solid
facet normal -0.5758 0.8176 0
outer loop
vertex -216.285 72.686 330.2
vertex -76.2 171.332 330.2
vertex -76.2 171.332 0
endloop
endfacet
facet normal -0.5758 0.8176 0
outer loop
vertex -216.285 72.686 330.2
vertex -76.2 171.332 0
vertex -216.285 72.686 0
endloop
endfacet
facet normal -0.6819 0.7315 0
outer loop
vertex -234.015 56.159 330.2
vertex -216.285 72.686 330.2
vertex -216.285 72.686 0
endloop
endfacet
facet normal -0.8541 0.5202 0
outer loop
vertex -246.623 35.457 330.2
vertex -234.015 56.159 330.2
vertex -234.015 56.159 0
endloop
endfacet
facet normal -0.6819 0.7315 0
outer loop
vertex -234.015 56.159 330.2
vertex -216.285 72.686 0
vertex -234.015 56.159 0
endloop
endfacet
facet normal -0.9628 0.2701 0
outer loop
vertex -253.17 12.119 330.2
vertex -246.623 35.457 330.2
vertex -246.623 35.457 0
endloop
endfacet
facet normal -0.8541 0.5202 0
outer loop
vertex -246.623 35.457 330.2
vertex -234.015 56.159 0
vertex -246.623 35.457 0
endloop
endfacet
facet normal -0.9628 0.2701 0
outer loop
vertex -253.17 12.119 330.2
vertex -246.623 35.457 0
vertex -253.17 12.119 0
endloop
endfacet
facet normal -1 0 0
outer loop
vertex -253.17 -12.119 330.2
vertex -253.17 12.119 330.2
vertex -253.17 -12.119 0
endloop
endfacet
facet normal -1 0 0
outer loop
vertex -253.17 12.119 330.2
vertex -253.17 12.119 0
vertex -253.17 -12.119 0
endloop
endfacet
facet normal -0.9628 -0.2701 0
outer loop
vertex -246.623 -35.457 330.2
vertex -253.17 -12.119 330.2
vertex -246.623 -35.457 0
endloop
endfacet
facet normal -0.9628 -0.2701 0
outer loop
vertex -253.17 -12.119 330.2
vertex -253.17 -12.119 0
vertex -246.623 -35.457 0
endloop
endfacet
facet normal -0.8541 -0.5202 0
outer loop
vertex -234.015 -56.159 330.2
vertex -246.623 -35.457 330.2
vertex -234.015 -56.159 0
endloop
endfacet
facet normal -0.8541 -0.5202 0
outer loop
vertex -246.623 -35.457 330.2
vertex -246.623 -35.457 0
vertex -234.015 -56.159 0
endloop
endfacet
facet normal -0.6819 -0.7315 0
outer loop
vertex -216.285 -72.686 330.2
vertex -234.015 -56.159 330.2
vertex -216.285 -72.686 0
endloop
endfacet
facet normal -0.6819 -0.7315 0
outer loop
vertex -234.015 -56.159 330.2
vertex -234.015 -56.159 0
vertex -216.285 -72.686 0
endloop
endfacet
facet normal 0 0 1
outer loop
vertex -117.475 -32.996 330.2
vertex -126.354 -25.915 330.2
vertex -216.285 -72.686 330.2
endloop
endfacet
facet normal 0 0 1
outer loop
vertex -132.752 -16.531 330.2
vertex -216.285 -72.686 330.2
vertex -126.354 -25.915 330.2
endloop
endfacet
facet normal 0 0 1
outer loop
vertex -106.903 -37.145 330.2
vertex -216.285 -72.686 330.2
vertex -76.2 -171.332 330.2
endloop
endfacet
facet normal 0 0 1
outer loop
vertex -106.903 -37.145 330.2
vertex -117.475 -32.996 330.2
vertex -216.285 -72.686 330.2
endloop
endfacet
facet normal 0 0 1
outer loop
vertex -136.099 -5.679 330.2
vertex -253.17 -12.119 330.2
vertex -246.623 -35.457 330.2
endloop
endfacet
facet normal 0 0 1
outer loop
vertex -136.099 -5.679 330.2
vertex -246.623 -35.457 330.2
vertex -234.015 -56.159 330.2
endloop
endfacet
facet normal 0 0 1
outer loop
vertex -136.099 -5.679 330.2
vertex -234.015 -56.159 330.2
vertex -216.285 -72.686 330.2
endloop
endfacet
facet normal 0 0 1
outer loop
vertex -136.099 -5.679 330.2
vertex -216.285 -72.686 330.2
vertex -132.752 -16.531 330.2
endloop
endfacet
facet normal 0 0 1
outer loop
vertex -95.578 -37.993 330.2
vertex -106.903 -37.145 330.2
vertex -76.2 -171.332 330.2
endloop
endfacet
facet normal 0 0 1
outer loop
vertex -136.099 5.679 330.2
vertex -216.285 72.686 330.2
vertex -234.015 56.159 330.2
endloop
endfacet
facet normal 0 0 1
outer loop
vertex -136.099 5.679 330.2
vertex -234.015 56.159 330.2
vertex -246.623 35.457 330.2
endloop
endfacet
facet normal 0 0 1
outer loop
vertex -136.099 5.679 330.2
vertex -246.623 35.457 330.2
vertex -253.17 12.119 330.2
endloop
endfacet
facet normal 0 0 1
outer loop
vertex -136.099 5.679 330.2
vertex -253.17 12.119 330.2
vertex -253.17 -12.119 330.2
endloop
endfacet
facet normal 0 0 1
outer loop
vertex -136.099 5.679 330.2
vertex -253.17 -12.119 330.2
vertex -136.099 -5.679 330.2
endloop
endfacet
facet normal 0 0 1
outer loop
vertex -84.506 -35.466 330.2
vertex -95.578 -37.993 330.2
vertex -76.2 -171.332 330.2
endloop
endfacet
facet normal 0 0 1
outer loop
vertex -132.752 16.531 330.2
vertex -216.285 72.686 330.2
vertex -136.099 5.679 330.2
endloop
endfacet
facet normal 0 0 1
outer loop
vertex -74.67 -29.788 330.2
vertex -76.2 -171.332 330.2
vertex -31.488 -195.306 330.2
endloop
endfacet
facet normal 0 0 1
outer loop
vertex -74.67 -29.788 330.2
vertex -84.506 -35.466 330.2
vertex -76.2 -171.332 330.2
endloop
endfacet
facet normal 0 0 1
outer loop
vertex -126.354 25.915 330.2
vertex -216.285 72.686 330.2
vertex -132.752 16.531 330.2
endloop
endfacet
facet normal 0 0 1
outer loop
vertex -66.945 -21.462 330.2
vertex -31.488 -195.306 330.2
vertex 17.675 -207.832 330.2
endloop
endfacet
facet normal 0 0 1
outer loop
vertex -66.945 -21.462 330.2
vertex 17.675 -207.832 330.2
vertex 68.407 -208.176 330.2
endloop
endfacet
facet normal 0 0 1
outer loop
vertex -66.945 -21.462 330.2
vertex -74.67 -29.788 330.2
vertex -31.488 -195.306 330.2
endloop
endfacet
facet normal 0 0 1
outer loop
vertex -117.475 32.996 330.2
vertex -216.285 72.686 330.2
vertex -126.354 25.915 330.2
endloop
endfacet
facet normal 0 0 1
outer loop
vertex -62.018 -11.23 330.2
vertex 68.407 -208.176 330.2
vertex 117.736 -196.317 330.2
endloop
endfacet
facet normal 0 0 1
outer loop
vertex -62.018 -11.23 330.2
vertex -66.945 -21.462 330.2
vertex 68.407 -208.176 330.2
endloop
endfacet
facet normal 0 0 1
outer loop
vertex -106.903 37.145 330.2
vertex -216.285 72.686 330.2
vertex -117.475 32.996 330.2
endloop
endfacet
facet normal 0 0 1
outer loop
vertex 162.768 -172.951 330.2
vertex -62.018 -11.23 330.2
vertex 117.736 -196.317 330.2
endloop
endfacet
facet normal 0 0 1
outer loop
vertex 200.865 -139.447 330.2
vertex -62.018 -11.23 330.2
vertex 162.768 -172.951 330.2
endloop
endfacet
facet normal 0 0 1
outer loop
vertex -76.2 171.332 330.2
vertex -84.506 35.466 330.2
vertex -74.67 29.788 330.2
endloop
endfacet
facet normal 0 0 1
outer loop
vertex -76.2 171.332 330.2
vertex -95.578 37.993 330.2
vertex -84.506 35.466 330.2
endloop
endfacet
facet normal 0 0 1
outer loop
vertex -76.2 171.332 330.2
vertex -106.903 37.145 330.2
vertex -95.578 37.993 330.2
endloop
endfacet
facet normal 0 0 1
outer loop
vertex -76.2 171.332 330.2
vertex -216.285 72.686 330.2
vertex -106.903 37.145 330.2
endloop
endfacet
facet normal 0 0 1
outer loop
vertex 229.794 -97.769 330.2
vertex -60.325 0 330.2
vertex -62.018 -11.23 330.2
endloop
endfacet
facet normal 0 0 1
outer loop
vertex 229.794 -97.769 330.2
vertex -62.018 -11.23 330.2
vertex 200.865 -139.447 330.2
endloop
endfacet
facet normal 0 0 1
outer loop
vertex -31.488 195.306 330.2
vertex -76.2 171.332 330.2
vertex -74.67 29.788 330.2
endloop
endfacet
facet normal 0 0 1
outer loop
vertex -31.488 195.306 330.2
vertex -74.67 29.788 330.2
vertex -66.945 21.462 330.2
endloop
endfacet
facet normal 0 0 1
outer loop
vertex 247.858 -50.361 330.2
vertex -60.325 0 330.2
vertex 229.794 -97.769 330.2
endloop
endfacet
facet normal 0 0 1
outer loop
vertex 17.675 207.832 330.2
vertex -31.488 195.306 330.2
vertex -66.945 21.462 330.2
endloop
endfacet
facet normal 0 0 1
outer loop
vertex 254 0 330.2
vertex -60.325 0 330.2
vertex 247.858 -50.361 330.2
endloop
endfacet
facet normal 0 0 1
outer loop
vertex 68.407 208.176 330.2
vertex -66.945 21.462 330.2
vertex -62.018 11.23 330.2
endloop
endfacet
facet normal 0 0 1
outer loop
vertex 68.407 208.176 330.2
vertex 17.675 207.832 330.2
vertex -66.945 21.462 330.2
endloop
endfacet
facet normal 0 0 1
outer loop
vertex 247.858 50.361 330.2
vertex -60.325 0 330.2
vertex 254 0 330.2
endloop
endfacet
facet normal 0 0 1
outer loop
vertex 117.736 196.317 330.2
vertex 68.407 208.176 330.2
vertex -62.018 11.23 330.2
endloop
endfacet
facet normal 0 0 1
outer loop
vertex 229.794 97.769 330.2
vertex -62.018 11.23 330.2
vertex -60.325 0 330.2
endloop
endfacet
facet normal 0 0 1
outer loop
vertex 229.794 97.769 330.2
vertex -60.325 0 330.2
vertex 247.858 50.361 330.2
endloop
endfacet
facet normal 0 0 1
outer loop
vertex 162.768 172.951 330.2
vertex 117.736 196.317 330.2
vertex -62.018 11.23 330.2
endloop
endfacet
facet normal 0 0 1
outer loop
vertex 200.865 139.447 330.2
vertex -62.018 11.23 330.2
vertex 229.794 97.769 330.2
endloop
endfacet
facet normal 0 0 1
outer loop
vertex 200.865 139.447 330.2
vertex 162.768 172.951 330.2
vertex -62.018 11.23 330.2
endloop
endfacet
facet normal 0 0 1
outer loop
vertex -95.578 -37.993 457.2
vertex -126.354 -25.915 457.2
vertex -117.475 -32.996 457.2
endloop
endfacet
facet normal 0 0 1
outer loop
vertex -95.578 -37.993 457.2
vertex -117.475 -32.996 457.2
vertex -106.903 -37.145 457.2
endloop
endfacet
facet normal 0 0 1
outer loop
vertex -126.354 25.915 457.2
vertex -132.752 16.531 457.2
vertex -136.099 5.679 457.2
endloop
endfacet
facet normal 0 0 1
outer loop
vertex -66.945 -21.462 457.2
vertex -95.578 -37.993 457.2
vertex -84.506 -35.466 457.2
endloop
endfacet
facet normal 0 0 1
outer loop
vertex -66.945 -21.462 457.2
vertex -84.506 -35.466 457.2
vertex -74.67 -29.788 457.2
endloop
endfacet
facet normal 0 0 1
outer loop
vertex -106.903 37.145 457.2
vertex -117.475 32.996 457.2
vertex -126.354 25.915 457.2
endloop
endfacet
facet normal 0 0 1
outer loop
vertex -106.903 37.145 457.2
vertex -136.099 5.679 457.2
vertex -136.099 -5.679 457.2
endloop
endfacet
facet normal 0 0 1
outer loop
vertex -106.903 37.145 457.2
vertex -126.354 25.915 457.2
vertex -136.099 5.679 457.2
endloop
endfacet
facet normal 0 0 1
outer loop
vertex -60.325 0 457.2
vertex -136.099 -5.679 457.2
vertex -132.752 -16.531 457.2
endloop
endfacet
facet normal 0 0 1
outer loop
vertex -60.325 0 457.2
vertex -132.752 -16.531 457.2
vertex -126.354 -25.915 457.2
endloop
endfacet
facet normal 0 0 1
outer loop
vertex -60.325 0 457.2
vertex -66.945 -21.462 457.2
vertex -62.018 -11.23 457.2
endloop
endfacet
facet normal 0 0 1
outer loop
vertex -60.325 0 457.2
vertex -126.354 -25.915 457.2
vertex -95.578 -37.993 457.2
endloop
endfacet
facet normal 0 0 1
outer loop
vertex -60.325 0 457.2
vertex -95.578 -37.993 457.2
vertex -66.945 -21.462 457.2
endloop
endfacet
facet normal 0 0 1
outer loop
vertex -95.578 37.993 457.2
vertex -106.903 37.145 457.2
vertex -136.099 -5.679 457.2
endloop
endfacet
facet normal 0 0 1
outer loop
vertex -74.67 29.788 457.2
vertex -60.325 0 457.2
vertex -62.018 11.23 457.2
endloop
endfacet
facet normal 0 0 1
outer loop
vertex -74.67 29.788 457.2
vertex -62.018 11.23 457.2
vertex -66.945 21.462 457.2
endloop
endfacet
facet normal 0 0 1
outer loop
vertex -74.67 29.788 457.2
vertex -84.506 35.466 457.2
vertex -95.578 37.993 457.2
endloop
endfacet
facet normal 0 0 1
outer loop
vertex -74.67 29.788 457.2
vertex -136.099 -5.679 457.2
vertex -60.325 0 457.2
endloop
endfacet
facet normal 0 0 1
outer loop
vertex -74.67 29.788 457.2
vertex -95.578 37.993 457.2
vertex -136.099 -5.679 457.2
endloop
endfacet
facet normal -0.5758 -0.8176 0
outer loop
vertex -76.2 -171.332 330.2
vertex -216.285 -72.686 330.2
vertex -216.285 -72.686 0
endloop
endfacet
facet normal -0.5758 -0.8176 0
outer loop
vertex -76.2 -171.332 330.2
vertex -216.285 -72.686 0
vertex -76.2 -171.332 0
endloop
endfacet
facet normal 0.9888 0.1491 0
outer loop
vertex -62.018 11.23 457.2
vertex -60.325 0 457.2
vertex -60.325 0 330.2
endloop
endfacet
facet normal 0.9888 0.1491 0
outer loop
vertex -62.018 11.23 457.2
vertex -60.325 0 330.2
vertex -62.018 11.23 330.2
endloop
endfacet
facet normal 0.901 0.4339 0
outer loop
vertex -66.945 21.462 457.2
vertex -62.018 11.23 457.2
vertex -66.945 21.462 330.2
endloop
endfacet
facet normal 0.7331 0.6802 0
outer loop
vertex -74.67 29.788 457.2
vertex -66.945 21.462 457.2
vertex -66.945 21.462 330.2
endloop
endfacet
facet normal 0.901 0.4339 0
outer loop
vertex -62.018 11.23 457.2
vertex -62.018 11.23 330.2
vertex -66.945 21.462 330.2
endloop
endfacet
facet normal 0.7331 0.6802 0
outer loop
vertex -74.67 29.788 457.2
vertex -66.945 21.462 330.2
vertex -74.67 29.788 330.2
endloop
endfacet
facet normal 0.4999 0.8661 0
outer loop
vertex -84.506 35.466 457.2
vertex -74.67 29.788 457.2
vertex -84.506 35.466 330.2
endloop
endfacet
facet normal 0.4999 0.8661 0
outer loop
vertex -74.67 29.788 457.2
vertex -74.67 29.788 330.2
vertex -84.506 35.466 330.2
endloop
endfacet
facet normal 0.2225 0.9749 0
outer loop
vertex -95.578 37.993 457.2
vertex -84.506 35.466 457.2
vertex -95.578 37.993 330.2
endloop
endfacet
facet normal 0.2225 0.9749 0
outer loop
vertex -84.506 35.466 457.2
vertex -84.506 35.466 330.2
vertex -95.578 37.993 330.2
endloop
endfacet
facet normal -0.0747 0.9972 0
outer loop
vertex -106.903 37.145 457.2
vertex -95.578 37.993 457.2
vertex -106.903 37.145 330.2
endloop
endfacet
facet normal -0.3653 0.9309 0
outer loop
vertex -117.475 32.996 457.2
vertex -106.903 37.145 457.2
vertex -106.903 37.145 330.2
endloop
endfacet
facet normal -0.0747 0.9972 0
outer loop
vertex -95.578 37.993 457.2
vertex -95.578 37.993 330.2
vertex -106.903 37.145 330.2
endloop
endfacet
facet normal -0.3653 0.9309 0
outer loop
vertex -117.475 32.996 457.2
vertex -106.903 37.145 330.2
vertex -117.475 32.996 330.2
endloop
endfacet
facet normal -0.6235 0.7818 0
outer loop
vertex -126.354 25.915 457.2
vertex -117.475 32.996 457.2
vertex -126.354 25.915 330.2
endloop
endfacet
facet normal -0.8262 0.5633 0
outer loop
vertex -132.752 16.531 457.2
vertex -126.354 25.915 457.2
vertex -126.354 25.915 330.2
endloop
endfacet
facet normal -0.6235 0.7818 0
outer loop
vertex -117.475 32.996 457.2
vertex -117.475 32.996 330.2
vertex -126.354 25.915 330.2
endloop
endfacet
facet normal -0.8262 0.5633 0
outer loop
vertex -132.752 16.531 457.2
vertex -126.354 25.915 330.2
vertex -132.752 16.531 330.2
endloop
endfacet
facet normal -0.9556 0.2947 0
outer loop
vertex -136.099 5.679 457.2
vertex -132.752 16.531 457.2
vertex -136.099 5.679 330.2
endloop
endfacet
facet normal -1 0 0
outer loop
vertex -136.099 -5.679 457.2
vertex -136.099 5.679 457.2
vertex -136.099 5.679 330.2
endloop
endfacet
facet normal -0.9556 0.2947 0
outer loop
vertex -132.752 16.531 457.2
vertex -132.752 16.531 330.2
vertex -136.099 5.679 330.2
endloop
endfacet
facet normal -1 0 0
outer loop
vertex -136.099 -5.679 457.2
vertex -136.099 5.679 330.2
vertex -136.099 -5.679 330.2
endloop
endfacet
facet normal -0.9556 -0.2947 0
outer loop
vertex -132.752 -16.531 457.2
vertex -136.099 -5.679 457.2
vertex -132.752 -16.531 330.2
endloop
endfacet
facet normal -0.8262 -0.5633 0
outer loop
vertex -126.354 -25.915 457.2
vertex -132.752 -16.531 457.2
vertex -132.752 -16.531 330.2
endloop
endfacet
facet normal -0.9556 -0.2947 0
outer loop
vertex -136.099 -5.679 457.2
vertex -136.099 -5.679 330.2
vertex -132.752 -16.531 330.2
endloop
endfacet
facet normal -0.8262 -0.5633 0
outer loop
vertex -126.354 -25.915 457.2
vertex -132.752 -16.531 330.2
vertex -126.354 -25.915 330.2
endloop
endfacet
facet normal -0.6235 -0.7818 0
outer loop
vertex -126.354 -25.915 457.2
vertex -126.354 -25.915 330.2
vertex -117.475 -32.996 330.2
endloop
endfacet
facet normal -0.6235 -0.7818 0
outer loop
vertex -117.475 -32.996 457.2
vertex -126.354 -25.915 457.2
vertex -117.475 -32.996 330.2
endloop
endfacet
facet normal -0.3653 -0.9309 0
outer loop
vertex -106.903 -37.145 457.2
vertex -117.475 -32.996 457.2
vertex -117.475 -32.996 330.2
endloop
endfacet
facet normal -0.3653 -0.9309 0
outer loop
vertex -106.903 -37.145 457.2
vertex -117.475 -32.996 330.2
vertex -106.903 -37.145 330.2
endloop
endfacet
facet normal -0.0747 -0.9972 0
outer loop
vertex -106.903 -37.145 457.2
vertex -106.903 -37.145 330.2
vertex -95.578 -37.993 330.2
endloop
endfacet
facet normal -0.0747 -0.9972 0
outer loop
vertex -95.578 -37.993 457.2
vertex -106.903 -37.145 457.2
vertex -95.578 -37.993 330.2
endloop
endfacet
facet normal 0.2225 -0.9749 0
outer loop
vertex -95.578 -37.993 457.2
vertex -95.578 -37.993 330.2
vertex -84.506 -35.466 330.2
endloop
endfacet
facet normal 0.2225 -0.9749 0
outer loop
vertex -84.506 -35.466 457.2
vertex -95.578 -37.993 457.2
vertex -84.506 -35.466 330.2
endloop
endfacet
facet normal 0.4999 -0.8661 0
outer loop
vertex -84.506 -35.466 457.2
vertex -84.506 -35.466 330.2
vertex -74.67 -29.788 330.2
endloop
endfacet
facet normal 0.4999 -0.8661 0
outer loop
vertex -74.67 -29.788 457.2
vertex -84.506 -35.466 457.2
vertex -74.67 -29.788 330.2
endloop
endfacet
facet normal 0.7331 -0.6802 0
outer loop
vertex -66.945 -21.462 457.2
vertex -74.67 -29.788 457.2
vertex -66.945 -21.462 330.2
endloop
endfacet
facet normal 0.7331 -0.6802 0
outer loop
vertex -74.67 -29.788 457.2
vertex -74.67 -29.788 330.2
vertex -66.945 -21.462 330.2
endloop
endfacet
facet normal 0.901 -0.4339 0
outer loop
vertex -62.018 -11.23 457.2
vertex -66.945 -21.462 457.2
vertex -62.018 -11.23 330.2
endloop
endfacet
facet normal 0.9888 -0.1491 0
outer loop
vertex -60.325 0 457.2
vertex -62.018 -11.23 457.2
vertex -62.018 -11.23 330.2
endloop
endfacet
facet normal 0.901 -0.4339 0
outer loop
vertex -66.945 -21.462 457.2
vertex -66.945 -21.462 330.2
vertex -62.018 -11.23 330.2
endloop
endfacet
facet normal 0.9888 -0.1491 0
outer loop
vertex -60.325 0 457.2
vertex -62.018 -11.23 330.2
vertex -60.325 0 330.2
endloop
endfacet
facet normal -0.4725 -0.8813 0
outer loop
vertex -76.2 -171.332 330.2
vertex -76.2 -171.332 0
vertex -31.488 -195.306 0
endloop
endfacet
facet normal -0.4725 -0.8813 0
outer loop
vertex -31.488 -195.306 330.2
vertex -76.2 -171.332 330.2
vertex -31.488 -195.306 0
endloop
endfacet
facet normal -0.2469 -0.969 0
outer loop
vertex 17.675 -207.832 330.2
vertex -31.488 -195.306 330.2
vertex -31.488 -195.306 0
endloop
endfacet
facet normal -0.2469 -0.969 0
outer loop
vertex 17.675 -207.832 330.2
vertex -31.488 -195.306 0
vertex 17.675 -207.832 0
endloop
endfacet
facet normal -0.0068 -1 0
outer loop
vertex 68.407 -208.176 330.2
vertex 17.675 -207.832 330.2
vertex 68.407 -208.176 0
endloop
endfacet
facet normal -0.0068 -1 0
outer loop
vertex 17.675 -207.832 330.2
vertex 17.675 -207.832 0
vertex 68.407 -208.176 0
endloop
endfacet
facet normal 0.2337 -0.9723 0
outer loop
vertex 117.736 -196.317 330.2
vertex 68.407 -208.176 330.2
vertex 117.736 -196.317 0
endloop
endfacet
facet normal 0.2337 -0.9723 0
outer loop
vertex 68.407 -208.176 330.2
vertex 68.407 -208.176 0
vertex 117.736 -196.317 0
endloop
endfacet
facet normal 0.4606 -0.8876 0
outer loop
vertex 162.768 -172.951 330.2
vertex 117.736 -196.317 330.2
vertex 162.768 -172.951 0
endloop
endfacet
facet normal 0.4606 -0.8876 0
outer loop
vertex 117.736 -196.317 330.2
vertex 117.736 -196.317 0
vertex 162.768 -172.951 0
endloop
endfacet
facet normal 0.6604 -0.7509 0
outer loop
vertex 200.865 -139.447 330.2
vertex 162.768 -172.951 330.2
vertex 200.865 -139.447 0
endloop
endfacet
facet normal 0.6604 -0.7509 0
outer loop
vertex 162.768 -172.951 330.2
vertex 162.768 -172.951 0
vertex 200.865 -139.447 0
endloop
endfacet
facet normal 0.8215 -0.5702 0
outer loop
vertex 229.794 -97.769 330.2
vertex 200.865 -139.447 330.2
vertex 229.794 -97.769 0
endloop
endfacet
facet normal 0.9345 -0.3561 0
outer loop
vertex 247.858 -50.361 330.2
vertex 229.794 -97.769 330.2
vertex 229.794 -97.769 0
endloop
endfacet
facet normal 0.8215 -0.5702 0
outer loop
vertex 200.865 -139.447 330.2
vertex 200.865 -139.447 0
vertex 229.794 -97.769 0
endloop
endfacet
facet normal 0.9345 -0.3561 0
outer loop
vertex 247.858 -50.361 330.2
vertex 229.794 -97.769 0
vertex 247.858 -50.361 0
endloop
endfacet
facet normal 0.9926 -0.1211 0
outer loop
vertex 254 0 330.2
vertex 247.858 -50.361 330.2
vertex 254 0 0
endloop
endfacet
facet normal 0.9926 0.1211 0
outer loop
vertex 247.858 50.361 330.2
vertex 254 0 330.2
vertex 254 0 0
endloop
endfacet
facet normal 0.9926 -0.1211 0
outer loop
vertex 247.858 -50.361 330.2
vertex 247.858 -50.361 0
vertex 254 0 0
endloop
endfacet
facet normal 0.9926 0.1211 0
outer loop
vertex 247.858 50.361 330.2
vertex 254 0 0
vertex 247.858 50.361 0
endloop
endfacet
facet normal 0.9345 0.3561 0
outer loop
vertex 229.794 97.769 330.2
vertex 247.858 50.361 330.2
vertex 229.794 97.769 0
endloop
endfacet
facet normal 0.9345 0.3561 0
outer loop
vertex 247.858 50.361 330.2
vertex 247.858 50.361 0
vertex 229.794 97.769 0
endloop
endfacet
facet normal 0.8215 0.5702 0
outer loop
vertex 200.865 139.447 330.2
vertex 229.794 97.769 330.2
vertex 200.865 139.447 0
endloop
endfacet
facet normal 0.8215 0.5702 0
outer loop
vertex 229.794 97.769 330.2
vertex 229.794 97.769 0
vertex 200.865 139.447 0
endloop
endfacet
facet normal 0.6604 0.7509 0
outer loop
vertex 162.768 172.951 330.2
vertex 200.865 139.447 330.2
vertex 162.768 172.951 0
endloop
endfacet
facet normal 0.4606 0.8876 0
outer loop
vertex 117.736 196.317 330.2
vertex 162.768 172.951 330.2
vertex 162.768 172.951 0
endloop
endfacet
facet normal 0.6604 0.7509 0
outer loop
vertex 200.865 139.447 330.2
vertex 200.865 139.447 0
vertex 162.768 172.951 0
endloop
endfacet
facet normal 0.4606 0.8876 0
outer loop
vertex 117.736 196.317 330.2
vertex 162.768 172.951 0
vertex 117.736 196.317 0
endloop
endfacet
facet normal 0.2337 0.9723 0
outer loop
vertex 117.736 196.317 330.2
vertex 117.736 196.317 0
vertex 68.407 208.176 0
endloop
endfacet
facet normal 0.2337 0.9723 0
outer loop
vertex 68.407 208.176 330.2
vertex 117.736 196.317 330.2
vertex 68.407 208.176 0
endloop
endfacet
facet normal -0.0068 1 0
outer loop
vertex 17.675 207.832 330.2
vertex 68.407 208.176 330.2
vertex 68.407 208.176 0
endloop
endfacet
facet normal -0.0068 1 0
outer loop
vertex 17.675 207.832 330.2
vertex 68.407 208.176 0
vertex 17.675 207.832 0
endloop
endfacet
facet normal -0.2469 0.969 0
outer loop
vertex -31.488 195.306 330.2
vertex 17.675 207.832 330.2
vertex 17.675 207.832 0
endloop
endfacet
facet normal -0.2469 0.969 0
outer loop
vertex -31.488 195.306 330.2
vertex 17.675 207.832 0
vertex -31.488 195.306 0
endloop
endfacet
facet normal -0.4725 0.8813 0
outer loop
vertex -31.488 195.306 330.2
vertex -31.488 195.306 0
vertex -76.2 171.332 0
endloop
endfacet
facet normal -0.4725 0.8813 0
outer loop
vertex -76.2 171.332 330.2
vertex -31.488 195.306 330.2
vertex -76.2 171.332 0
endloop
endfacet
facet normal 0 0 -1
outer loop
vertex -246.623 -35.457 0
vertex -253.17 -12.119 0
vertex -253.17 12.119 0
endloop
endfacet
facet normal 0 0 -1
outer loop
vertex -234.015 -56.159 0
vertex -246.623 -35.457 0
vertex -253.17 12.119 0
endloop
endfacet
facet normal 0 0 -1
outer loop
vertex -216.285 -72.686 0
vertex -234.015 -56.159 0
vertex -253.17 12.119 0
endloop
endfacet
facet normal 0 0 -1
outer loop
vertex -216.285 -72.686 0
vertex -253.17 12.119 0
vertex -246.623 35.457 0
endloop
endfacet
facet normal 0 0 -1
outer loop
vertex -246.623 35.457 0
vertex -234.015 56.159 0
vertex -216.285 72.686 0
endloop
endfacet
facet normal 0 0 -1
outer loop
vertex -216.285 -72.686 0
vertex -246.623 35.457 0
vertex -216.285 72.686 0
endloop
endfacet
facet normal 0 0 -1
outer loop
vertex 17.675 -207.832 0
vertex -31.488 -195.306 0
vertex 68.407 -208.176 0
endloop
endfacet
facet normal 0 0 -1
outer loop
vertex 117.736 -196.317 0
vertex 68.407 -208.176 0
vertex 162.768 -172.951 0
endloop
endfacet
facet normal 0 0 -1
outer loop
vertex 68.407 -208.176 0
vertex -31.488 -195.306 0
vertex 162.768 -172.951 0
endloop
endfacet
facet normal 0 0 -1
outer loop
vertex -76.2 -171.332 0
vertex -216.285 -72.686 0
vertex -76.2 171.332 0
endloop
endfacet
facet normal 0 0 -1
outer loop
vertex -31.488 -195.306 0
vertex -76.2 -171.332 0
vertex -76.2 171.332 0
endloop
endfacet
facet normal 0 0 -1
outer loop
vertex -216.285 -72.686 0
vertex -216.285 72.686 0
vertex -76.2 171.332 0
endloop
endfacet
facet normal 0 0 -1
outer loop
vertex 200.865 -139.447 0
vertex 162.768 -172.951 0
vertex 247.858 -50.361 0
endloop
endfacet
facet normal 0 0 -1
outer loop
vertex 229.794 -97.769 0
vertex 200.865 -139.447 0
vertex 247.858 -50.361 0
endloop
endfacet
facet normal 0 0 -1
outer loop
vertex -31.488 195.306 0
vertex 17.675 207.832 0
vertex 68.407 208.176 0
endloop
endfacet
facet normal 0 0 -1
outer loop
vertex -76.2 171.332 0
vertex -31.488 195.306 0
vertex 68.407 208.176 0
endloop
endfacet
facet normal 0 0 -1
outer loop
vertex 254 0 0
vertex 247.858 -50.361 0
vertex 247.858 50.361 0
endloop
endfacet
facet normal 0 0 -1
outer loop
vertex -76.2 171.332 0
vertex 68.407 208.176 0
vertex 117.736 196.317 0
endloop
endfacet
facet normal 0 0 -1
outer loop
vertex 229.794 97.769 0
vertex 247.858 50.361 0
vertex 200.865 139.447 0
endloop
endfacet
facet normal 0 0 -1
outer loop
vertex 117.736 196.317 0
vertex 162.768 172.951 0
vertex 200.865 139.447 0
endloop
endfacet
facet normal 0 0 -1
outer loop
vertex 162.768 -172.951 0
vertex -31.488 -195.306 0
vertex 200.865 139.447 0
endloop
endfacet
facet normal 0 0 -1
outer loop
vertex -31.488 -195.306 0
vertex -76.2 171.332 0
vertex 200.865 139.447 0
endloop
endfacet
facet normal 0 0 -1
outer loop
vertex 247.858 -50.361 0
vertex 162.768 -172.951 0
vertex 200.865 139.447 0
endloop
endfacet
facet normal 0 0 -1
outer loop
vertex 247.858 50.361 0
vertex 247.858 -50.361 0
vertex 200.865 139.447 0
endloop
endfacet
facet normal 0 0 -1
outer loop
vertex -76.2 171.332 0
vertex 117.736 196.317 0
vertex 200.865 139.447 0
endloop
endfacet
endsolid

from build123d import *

# Parameters (mm, degrees)
F1_DEPTH = 330.2
F2_R     = 38.1
F3_DEPTH = 127


with BuildPart() as f1:
    # F0 (on Top) → F1 (new body)
    with BuildSketch(Plane.XY):
        with BuildLine():
            Line((-216.284848, -72.686459), (-76.2, -171.332367))
            ThreePointArc((-76.2, -171.332367), (254, 0), (-76.2, 171.332367))
            Line((-76.2, 171.332367), (-216.284848, 72.686459))
            ThreePointArc((-216.284848, 72.686459), (-254, 0), (-216.284848, -72.686459))
        make_face()
    extrude(amount=F1_DEPTH)

    # F2 (on face) → F3 (join)
    with BuildSketch(Plane.XY.offset(330.2)):
        with Locations((-98.425, 0)):
            Circle(F2_R)
    extrude(amount=F3_DEPTH)


solid = f1.part
